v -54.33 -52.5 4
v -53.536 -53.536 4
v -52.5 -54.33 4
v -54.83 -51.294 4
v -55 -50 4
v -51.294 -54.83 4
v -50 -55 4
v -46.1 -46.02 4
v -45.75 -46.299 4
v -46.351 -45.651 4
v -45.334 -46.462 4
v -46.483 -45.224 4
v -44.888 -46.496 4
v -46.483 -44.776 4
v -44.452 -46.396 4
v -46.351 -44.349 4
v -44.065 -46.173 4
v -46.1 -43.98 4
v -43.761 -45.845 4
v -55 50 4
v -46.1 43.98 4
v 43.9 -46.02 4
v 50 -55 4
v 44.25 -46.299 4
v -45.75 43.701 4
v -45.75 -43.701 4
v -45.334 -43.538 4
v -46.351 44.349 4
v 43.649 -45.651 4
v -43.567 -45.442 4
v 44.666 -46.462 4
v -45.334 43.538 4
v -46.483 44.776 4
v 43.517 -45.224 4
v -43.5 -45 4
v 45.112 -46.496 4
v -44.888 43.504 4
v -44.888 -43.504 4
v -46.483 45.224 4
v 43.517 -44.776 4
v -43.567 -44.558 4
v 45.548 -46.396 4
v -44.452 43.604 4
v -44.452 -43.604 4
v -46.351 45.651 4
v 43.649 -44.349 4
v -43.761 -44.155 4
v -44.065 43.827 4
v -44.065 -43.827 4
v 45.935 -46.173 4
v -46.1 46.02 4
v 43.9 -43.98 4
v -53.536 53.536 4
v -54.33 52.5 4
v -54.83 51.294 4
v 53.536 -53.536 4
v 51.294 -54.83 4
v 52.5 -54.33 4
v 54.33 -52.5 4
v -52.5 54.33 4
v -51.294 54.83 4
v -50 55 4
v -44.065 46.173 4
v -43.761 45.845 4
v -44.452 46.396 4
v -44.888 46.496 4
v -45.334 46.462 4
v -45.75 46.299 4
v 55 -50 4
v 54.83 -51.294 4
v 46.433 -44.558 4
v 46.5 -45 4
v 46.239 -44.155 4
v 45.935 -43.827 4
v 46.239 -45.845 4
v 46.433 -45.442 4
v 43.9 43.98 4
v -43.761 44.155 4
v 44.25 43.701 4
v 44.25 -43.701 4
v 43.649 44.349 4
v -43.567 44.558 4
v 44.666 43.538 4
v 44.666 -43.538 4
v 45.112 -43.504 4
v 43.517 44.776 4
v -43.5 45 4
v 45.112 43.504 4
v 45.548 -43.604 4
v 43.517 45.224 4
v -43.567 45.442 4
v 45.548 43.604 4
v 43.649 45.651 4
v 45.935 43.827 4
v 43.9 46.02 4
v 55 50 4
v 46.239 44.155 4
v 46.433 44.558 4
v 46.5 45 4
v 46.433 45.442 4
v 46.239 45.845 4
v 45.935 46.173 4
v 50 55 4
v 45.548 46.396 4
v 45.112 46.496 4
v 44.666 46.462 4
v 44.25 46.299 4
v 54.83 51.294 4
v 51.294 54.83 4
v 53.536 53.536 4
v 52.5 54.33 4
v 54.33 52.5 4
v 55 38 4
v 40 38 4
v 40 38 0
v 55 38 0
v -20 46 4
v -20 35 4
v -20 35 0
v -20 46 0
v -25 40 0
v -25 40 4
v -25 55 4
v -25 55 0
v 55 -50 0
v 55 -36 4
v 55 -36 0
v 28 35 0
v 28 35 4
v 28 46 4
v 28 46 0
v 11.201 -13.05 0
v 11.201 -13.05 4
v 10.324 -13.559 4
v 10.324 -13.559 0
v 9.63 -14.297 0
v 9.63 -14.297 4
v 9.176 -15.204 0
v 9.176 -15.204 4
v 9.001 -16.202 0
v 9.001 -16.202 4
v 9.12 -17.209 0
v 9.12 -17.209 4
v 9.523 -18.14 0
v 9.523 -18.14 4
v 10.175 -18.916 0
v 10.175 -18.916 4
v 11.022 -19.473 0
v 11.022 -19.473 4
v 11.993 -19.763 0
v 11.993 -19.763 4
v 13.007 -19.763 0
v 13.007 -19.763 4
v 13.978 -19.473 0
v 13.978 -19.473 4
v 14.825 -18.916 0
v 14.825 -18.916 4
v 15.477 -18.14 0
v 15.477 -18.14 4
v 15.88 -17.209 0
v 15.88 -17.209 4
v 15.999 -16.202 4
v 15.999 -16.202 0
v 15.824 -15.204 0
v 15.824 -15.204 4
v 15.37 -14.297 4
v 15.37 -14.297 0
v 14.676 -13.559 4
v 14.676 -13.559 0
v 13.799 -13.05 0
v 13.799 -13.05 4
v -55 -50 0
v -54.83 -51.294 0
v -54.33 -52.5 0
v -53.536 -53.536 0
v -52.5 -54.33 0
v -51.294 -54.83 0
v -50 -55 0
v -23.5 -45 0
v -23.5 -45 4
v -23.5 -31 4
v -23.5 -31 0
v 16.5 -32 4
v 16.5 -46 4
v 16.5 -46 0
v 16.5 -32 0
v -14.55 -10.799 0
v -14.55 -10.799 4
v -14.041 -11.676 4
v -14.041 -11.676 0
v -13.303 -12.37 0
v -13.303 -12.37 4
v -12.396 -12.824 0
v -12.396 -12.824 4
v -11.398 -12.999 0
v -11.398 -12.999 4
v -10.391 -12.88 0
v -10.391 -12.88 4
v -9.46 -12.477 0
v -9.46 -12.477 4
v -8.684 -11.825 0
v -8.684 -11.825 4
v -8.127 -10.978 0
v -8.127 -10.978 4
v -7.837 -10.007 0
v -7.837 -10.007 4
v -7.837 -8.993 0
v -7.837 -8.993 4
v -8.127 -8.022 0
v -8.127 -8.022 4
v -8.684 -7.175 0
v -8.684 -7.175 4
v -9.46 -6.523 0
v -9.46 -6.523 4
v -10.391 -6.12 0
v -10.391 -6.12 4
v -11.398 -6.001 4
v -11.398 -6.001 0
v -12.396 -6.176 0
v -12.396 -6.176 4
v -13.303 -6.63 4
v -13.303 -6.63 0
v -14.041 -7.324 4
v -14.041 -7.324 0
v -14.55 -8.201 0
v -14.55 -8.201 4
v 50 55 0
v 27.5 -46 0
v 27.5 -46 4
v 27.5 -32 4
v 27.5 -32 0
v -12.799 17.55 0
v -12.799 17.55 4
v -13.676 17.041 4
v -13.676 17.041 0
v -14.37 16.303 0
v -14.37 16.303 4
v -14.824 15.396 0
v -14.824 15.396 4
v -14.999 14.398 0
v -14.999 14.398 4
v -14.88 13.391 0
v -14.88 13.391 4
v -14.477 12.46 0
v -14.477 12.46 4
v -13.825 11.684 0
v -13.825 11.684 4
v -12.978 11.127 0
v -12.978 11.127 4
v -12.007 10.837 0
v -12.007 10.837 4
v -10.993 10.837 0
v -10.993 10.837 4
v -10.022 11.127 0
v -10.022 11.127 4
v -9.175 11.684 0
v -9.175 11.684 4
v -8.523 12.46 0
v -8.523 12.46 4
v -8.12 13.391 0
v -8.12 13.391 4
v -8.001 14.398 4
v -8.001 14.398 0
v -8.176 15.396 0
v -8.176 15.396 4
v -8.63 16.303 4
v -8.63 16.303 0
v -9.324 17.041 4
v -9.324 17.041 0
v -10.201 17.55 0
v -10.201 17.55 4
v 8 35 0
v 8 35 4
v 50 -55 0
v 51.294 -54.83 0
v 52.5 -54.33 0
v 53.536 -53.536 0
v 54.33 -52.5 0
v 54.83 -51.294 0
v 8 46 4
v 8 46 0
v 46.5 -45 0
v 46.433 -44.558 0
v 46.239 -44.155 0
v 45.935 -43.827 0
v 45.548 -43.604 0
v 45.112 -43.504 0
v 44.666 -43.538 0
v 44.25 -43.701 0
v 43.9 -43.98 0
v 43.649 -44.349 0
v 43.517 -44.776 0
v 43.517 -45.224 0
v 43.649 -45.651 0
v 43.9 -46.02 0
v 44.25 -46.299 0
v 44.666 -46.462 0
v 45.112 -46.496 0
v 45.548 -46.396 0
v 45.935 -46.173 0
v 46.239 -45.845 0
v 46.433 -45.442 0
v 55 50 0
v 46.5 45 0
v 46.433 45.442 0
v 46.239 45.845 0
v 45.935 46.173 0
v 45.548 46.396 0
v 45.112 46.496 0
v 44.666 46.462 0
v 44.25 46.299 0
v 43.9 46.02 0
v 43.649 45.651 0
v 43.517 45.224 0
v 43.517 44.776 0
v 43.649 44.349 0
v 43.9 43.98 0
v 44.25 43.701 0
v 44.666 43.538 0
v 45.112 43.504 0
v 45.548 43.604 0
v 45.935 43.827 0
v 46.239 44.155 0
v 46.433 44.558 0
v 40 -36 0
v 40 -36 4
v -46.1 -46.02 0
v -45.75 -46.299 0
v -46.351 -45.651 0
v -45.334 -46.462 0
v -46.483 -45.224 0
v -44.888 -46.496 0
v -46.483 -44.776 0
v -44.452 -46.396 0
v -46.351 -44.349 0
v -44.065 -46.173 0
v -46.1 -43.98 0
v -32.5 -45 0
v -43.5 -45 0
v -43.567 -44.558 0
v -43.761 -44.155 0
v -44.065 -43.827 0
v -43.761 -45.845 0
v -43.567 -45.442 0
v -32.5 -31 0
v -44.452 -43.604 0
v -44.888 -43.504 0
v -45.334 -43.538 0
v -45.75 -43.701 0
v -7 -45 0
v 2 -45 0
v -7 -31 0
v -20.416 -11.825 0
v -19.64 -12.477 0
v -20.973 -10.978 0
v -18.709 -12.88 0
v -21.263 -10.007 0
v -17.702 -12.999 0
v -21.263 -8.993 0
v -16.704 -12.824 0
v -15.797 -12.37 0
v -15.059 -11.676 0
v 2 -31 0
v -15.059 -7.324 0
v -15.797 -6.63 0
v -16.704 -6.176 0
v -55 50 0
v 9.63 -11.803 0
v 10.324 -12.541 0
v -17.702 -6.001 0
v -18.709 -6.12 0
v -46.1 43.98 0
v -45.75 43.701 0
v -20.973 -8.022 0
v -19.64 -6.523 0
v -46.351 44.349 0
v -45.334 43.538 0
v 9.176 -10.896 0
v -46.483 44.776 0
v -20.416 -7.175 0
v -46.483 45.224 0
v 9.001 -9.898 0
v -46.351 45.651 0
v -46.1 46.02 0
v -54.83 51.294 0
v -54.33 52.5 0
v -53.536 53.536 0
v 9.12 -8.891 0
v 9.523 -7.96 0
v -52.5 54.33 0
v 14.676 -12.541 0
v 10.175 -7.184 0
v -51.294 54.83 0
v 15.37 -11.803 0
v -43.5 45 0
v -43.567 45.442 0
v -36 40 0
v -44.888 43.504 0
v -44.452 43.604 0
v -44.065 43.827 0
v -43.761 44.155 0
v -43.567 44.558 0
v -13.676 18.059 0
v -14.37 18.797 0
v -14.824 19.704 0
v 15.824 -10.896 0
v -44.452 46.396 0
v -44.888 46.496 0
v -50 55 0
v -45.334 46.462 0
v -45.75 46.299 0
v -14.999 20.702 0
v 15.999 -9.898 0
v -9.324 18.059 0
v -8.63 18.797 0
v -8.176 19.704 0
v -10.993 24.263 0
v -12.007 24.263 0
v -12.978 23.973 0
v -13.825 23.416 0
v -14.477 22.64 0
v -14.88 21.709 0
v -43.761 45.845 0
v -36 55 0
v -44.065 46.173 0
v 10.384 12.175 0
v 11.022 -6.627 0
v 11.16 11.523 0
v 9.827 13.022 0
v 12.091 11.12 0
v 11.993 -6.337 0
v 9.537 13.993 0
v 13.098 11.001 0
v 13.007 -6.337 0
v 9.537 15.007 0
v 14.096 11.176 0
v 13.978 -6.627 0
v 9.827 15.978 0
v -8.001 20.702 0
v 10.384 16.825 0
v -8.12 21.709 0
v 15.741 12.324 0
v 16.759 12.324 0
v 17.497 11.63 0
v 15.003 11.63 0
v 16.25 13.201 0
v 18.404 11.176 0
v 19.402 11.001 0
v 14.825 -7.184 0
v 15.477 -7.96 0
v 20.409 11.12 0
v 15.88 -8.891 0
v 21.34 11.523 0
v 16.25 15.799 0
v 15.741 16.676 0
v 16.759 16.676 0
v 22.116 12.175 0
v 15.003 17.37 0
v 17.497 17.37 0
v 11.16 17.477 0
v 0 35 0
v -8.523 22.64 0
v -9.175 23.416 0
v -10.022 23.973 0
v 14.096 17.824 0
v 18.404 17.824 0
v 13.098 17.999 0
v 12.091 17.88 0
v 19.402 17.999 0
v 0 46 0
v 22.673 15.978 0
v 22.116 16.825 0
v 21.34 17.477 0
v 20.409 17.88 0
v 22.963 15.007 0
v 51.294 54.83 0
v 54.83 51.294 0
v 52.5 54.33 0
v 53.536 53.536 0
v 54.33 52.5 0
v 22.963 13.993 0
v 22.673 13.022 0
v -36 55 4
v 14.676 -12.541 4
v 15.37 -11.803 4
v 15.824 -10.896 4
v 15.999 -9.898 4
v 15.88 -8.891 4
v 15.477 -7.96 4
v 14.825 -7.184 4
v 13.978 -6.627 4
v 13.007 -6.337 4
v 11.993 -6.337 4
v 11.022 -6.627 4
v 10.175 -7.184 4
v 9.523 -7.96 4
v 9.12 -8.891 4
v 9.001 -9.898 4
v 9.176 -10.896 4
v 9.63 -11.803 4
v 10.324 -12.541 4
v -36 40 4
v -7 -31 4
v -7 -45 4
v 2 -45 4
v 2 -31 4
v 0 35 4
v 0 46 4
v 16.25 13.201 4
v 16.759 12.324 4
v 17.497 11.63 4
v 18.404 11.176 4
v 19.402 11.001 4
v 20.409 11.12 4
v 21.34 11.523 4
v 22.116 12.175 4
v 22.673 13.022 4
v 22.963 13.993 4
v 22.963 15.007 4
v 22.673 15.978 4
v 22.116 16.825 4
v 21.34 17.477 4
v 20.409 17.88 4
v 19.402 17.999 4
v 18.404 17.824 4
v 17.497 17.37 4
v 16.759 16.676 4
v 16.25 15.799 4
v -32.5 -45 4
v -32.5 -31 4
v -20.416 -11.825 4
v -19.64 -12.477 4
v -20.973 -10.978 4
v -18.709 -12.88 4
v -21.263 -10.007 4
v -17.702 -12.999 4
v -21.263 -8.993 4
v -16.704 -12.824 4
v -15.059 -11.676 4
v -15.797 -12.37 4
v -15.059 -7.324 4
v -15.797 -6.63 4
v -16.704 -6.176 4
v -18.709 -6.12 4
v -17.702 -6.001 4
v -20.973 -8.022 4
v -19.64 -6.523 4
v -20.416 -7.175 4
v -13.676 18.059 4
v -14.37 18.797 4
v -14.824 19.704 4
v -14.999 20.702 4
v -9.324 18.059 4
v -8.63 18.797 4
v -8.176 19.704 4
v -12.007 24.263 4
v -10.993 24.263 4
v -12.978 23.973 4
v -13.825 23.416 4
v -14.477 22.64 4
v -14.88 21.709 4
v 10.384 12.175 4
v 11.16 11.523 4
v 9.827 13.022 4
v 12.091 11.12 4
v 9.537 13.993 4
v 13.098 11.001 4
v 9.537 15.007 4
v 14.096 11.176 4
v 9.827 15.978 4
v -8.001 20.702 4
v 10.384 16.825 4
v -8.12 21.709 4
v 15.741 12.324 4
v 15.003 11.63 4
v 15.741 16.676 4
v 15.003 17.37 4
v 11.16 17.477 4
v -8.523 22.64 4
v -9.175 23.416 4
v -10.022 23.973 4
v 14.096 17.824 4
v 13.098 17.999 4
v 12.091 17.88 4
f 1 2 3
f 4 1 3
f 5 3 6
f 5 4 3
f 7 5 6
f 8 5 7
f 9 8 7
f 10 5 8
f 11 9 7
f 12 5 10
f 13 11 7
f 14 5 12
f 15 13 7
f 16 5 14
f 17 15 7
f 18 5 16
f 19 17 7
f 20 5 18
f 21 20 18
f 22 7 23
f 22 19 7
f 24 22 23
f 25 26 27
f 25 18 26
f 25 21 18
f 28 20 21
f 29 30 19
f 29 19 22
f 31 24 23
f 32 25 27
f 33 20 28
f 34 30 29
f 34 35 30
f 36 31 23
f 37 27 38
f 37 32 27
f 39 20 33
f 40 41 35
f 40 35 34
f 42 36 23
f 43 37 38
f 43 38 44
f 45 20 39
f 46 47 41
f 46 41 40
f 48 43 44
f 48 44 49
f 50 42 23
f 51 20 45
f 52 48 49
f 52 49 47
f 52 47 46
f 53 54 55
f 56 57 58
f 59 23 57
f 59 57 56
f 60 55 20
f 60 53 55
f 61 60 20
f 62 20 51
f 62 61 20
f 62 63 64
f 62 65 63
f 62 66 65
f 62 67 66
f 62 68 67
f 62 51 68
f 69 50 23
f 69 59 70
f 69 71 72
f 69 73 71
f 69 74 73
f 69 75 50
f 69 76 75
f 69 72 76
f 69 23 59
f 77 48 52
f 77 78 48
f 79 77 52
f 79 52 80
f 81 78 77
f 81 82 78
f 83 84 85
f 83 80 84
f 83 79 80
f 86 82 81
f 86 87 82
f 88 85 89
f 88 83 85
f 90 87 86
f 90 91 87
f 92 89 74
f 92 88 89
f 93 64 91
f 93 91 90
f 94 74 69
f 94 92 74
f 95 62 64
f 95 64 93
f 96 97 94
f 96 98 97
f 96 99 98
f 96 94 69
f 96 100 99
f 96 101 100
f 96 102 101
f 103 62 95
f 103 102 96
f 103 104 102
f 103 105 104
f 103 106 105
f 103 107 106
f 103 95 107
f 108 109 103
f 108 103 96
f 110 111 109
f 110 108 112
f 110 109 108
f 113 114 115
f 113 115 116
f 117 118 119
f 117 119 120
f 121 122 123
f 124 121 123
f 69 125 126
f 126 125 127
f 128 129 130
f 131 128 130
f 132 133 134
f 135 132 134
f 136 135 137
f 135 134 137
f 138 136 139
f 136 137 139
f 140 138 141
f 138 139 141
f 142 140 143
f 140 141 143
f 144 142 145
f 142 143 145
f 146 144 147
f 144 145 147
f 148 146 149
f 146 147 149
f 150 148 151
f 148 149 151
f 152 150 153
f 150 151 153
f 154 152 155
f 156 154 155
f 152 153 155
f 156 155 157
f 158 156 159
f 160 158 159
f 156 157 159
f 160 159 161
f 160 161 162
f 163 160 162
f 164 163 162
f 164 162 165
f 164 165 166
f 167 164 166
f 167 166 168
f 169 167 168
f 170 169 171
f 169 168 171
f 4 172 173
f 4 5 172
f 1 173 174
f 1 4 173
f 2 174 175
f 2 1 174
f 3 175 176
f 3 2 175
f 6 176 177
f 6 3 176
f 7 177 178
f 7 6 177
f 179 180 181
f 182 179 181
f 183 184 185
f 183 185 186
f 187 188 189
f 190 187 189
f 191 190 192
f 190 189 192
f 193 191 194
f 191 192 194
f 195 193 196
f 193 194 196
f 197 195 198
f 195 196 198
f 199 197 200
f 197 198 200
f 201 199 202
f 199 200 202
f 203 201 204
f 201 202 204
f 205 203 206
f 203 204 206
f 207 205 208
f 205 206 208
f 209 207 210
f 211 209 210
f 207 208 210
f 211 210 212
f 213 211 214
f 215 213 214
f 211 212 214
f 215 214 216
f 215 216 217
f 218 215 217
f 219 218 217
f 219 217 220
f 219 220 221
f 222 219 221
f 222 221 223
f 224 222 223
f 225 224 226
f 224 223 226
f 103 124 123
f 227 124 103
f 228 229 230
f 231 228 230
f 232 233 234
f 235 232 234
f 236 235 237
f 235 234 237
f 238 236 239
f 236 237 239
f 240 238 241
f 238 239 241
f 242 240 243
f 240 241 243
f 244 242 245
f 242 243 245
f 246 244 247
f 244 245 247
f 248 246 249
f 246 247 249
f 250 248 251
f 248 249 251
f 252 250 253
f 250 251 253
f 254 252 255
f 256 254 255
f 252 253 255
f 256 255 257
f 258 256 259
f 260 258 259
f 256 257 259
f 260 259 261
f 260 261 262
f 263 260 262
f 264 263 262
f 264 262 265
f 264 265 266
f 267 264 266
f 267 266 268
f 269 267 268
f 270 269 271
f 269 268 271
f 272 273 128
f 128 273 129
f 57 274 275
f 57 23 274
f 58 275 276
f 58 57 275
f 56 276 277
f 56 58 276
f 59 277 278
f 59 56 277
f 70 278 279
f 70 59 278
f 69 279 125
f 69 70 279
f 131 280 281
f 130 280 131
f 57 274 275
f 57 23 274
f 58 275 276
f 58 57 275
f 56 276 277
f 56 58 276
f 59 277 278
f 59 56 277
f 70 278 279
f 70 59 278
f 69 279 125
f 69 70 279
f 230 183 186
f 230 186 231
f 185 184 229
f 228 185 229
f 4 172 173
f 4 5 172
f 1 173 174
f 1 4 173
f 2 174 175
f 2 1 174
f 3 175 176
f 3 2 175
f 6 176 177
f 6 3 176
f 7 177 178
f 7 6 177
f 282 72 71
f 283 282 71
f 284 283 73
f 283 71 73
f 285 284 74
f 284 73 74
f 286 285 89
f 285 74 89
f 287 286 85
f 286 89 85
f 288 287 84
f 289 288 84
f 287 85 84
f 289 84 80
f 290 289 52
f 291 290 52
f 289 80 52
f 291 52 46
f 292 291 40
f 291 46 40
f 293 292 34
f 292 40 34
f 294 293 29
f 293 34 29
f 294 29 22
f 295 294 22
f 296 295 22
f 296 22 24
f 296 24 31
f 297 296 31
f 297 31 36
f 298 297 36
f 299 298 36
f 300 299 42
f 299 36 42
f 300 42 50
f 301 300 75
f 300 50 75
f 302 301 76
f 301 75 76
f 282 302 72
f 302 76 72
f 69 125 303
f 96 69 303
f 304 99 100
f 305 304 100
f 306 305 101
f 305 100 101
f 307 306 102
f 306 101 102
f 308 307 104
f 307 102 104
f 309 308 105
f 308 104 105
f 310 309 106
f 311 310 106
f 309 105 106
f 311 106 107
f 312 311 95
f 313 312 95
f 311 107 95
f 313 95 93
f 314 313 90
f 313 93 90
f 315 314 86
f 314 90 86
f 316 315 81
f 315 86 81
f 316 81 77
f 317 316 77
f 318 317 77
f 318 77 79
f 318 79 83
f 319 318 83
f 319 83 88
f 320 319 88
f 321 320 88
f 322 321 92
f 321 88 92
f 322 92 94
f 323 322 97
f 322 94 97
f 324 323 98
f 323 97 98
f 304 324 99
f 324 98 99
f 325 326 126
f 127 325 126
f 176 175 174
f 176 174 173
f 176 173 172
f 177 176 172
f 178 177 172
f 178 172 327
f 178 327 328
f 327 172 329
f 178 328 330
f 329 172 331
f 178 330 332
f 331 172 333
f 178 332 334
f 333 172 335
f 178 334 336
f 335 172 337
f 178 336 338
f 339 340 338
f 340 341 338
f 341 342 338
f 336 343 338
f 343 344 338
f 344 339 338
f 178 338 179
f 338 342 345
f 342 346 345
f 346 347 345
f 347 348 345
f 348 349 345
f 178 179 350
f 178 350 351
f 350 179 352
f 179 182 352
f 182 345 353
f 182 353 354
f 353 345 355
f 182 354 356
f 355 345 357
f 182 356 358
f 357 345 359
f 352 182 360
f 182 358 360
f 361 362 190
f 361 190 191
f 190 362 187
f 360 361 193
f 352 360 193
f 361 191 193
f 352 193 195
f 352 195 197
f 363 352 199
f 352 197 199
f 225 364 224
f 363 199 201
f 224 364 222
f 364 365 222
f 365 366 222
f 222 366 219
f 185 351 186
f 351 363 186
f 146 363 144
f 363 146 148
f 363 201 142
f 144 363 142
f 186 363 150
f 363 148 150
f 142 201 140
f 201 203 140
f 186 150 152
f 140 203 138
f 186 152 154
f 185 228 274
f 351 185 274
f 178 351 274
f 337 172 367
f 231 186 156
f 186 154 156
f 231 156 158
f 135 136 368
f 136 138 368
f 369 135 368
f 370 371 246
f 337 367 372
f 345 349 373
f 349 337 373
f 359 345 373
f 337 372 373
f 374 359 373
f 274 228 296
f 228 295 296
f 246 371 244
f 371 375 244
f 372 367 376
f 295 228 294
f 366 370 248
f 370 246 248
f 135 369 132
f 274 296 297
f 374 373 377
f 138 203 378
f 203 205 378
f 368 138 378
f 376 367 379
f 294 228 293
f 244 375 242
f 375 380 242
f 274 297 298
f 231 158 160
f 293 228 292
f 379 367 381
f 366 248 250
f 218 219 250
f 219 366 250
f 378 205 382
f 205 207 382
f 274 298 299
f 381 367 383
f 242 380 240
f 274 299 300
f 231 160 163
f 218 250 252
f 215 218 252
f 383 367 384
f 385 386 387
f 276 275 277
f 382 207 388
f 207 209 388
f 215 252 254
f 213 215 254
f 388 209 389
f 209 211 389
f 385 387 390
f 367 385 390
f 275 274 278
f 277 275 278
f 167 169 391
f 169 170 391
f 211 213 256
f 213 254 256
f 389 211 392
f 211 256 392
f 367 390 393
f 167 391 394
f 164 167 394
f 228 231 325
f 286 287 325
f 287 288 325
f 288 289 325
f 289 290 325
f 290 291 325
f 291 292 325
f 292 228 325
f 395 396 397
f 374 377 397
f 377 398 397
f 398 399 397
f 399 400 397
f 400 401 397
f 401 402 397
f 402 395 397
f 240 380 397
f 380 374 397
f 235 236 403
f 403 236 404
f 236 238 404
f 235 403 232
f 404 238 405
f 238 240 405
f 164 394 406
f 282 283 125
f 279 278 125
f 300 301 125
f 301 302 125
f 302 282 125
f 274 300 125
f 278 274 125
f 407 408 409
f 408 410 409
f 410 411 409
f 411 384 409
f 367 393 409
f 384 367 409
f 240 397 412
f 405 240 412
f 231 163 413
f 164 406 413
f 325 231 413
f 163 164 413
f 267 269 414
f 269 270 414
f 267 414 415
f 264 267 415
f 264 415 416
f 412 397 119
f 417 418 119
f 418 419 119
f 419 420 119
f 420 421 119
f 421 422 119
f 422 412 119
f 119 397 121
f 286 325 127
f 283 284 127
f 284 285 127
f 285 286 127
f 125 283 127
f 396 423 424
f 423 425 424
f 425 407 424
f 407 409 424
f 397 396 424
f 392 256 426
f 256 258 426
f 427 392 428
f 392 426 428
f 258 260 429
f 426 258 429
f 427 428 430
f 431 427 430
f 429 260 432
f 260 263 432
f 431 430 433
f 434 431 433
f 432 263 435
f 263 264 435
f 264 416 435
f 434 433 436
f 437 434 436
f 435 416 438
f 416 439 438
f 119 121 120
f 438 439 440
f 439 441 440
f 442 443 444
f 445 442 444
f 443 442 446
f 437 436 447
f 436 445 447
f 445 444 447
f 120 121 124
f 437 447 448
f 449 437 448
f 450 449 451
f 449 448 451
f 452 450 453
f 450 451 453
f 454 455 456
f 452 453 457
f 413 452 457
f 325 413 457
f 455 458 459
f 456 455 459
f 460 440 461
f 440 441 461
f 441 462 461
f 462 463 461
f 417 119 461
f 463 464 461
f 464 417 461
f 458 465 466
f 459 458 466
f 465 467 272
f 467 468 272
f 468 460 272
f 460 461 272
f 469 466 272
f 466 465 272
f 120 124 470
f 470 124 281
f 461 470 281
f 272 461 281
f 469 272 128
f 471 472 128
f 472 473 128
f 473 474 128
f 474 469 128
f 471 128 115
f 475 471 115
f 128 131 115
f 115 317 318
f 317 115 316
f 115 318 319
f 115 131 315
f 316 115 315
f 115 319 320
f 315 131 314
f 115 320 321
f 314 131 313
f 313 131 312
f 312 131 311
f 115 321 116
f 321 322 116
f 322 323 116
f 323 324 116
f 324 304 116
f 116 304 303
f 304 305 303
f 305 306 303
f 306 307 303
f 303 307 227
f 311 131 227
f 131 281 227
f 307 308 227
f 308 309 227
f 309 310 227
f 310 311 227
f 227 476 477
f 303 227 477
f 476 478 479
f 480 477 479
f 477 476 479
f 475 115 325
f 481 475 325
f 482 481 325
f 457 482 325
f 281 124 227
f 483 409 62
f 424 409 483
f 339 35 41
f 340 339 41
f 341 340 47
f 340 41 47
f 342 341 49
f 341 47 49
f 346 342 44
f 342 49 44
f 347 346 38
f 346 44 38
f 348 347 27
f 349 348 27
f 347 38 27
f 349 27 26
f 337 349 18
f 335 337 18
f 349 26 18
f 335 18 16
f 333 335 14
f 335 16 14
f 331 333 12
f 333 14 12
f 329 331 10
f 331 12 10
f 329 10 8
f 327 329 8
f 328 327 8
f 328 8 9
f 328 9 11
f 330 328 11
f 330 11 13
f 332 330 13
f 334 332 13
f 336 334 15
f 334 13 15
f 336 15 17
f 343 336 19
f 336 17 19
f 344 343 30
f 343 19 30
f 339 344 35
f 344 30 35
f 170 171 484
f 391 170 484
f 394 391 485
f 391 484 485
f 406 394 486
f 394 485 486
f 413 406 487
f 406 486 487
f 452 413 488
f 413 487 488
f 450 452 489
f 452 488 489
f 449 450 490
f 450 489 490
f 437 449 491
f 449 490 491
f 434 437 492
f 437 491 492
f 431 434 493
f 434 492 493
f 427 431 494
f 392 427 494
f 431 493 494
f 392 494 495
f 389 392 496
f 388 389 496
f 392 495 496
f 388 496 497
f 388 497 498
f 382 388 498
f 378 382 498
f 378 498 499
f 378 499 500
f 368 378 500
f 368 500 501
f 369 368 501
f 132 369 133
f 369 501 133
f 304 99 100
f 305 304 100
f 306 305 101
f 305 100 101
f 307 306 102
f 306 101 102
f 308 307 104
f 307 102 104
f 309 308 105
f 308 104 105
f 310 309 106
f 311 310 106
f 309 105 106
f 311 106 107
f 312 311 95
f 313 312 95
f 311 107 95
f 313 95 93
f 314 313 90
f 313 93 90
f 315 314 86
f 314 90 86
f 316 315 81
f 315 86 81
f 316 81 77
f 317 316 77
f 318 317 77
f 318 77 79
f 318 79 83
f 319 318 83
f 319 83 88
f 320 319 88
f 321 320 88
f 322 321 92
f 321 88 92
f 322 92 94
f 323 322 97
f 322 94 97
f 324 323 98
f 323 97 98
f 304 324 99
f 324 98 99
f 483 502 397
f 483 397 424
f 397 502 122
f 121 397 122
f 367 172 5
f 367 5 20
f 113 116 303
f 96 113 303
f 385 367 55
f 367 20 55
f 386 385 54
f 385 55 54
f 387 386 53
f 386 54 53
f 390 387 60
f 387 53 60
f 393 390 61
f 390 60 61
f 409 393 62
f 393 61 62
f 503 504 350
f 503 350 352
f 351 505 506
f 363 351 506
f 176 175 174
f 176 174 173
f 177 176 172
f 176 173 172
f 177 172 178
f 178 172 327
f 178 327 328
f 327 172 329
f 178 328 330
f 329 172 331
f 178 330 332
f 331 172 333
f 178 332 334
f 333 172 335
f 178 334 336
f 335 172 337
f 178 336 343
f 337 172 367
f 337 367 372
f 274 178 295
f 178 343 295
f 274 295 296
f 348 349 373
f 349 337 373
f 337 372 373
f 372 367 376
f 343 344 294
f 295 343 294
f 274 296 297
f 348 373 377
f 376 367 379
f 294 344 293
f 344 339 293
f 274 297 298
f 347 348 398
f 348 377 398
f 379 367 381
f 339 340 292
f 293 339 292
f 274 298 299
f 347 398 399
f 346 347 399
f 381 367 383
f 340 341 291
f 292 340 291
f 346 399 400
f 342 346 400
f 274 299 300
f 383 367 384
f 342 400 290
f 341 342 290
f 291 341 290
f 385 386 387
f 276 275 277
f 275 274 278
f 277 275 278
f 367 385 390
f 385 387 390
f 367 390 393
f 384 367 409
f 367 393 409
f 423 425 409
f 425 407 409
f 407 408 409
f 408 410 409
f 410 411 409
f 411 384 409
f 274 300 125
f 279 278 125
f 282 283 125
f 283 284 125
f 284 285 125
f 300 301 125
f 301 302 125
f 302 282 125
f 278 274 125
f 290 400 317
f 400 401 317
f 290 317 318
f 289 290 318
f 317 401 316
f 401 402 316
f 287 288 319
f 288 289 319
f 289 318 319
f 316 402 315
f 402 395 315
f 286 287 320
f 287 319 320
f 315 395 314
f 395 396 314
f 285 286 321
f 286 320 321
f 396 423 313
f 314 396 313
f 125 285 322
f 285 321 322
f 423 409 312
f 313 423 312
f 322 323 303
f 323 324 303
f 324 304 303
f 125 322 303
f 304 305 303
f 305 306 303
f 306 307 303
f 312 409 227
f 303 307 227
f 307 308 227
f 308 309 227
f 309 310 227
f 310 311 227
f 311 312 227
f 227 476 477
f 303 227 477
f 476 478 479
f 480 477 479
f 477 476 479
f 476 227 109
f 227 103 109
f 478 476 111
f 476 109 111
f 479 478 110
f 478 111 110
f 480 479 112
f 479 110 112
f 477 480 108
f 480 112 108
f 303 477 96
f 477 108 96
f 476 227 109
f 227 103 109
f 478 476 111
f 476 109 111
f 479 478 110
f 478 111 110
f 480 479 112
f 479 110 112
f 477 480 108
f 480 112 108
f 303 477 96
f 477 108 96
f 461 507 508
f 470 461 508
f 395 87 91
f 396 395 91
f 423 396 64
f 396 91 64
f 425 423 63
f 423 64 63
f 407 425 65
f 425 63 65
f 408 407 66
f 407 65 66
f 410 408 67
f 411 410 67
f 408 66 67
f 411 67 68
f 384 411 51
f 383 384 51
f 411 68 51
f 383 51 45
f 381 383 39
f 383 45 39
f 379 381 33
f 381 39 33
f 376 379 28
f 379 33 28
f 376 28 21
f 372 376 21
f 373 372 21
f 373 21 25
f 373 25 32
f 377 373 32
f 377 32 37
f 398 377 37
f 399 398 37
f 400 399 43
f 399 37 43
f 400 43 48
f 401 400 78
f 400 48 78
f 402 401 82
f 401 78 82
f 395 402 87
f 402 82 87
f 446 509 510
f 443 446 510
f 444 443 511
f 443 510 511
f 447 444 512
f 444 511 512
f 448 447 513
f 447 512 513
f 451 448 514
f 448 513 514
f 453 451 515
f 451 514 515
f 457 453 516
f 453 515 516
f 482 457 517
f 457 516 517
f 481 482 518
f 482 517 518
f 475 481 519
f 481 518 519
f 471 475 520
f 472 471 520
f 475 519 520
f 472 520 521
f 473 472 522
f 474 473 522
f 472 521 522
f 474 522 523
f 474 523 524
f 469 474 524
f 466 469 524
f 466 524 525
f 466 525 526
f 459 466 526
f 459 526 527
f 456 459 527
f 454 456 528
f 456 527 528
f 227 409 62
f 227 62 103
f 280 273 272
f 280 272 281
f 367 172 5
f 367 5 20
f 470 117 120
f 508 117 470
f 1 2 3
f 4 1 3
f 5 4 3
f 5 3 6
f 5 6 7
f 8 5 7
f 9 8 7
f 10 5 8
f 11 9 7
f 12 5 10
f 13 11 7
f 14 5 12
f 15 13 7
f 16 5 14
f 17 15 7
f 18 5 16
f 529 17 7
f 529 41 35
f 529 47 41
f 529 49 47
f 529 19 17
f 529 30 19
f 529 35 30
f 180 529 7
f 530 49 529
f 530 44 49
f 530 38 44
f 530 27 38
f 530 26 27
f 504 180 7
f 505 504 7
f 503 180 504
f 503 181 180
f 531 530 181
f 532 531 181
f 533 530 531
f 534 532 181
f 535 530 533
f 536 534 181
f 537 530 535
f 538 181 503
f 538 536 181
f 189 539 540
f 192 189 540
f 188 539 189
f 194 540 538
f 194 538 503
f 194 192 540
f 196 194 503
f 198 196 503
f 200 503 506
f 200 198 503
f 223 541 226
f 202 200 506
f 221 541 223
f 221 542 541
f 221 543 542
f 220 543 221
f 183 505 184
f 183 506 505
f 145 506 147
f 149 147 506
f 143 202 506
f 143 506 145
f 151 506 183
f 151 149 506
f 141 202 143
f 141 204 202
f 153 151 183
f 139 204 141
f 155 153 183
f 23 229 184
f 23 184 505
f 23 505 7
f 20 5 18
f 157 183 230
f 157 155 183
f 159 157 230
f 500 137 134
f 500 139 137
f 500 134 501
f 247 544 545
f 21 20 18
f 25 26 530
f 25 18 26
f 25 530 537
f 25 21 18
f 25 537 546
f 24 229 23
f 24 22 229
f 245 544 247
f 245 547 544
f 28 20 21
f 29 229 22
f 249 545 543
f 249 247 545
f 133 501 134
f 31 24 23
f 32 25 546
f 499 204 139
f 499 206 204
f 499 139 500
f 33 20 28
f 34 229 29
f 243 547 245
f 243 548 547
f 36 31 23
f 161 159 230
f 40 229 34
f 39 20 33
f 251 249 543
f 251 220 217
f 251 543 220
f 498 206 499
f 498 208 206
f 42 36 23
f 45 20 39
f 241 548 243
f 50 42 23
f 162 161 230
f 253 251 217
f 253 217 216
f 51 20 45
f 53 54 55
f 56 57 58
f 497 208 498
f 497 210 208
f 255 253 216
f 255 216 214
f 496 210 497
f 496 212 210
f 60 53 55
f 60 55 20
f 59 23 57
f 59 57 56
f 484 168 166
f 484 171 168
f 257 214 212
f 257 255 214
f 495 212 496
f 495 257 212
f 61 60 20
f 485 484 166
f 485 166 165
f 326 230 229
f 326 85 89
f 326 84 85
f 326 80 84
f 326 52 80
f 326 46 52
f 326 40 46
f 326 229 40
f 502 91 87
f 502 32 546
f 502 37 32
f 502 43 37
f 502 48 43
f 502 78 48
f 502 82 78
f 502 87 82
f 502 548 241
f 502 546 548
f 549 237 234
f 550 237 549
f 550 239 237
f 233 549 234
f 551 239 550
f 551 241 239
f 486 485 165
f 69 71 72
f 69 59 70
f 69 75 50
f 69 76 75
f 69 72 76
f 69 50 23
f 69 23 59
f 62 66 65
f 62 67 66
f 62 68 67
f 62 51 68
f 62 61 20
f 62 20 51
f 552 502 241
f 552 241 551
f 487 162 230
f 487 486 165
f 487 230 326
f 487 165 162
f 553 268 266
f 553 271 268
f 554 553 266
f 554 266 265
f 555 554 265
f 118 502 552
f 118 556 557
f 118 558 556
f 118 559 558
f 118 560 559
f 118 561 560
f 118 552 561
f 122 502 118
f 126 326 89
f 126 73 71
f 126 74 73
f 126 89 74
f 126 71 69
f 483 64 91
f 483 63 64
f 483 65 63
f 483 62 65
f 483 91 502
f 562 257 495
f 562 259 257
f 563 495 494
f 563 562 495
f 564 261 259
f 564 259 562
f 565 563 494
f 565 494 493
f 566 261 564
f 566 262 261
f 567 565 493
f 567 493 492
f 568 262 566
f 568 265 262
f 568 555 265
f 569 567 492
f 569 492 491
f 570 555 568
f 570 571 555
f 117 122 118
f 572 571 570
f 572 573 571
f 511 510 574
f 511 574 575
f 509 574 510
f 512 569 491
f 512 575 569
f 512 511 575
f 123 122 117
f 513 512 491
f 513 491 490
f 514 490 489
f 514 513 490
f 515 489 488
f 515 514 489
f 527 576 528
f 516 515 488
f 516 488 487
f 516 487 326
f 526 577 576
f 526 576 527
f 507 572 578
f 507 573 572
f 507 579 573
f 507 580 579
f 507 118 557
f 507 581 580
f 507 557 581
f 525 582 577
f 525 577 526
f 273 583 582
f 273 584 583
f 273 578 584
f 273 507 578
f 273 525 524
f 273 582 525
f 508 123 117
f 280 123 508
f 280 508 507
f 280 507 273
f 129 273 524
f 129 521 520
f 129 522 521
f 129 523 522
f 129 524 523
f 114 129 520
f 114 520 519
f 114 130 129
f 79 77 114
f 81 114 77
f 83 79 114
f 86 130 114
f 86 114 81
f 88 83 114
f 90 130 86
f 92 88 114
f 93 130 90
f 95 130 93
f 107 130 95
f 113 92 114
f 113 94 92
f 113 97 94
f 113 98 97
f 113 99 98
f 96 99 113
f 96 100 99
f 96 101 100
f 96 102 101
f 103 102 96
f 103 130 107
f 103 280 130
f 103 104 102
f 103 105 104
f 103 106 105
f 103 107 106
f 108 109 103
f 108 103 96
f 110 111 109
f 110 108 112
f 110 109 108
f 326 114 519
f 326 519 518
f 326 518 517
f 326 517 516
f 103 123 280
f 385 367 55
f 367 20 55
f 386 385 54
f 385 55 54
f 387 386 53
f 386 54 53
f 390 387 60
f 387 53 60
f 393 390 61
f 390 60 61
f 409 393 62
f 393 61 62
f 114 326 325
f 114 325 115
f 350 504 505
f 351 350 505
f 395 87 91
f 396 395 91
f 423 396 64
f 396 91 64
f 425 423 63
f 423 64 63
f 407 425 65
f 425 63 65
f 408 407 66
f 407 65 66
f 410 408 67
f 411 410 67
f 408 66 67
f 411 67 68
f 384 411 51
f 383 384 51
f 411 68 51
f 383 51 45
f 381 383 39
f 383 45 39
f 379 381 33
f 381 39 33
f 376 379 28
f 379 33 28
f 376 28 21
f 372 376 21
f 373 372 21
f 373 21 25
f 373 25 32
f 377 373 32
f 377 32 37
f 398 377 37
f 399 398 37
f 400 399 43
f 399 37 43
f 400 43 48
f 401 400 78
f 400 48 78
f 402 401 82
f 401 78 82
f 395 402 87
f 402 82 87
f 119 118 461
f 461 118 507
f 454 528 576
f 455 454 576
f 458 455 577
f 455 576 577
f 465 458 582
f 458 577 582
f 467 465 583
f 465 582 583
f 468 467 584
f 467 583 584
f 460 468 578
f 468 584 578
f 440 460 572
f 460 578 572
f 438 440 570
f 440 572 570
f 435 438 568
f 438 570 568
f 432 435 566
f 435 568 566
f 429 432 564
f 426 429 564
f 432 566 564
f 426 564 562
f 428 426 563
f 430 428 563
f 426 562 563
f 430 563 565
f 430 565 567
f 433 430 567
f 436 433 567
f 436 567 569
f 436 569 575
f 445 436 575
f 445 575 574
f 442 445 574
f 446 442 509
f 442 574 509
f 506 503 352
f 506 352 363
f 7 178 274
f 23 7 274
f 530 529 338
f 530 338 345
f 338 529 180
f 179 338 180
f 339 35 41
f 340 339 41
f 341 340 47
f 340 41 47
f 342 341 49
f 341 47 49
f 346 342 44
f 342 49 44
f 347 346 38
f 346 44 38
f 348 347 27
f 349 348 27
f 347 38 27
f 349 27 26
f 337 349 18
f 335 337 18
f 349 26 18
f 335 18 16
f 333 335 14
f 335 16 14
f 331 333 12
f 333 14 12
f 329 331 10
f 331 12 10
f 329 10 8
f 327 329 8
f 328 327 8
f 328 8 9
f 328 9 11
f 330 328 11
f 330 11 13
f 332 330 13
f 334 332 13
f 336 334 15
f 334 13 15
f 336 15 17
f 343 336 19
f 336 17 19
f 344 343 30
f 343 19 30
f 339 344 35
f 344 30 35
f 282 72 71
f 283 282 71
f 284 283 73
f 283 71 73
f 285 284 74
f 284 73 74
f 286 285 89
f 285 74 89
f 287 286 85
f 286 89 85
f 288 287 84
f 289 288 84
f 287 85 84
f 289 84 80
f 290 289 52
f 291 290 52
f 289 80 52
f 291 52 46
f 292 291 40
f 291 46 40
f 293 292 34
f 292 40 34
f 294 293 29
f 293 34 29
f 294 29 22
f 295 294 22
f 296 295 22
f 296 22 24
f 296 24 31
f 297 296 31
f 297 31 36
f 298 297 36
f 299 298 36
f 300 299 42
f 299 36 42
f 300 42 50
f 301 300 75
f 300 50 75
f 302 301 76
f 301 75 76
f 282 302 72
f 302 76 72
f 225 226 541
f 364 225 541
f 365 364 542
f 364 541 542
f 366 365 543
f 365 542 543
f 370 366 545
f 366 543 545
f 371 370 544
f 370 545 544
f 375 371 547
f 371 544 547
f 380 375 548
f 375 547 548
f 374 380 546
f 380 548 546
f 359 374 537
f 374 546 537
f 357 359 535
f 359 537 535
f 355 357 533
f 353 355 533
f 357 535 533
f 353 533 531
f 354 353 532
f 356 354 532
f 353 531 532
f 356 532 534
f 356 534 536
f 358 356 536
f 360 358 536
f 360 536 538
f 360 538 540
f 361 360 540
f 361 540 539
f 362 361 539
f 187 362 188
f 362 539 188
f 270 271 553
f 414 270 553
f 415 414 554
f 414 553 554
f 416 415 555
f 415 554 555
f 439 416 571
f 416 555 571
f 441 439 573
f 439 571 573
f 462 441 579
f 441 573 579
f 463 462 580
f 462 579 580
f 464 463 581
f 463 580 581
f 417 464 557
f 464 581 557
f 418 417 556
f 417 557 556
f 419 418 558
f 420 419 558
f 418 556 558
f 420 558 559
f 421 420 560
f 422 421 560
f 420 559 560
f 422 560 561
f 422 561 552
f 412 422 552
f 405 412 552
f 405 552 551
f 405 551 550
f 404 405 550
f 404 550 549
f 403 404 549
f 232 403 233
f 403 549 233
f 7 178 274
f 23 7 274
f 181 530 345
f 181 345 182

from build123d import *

# Parameters (mm, degrees)
SKETCH_W        = 110
SKETCH_H        = 110
PAD_DEPTH       = 4
SKETCH001_R     = 1.5
POCKET_DEPTH    = 4
FILLET_R        = 5
SKETCH002_W     = 110
SKETCH002_H     = 110
PAD001_DEPTH    = 4
SKETCH003_R     = 1.5
POCKET001_DEPTH = 4
FILLET001_R     = 5
SKETCH004_W     = 15
SKETCH004_H     = 74
SKETCH004_W_2   = 11
SKETCH004_H_2   = 15
POCKET002_DEPTH = 4
SKETCH005_W     = 20
SKETCH005_H     = 11
SKETCH005_W_2   = 9
SKETCH005_H_2   = 14
SKETCH005_W_3   = 11
POCKET003_DEPTH = 4
POCKET004_DEPTH = 4


with BuildPart() as bottom:
    # Sketch → Pad (new body)
    with BuildSketch(Plane.XY):
        Rectangle(SKETCH_W, SKETCH_H)
    extrude(amount=PAD_DEPTH)

    # Sketch001 (on Face6 of Pad) → Pocket (cut)
    with BuildSketch(Plane.XY.offset(4)):
        with Locations((-45, 45)):
            Circle(SKETCH001_R)
        with Locations((45, 45)):
            Circle(SKETCH001_R)
        with Locations((-45, -45)):
            Circle(SKETCH001_R)
        with Locations((45, -45)):
            Circle(SKETCH001_R)
    extrude(amount=-POCKET_DEPTH, mode=Mode.SUBTRACT)

    # Fillet
    fillet_edges = [bottom.edges().sort_by_distance(p)[0] for p in [
        (55, -55, 2),
        (-55, -55, 2),
        (55, 55, 2),
        (-55, 55, 2),
    ]]
    fillet(fillet_edges, radius=FILLET_R)


with BuildPart() as top:
    # Sketch002 → Pad001 (new body)
    with BuildSketch(Plane.XY):
        Rectangle(SKETCH002_W, SKETCH002_H)
    extrude(amount=PAD001_DEPTH)

    # Sketch003 (on Face6 of Pad001) → Pocket001 (cut)
    with BuildSketch(Plane.XY.offset(4)):
        with Locations((-45, 45)):
            Circle(SKETCH003_R)
        with Locations((45, 45)):
            Circle(SKETCH003_R)
        with Locations((-45, -45)):
            Circle(SKETCH003_R)
        with Locations((45, -45)):
            Circle(SKETCH003_R)
    extrude(amount=-POCKET001_DEPTH, mode=Mode.SUBTRACT)

    # Fillet001
    fillet001_edges = [top.edges().sort_by_distance(p)[0] for p in [
        (55, -55, 2),
        (-55, -55, 2),
        (55, 55, 2),
        (-55, 55, 2),
    ]]
    fillet(fillet001_edges, radius=FILLET001_R)

    # Sketch004 (on Face5 of Fillet001) → Pocket002 (cut)
    with BuildSketch(Plane.XY.offset(4)):
        with Locations((47.5, 1)):
            Rectangle(SKETCH004_W, SKETCH004_H)
        with Locations((-30.5, 47.5)):
            Rectangle(SKETCH004_W_2, SKETCH004_H_2)
    extrude(amount=-POCKET002_DEPTH, mode=Mode.SUBTRACT)

    # Sketch005 (on Face4 of Pocket002) → Pocket003 (cut)
    with BuildSketch(Plane.XY.offset(4)):
        with Locations((-10, 40.5)):
            Rectangle(SKETCH005_W, SKETCH005_H)
        with Locations((18, 40.5)):
            Rectangle(SKETCH005_W, SKETCH005_H)
        with Locations((-28, -38)):
            Rectangle(SKETCH005_W_2, SKETCH005_H_2)
        with Locations((-2.5, -38)):
            Rectangle(SKETCH005_W_2, SKETCH005_H_2)
        with Locations((22, -39)):
            Rectangle(SKETCH005_W_3, SKETCH005_H_2)
    extrude(amount=-POCKET003_DEPTH, mode=Mode.SUBTRACT)

    # Sketch006 (on Face4 of Pocket003) → Pocket004 (cut)
    with BuildSketch(Plane.XY.offset(4)):
        with BuildLine():
            ThreePointArc((-12.799038, 17.55), (-11.5, 10.8), (-10.200962, 17.55))
            ThreePointArc((-10.200962, 17.55), (-11.5, 24.3), (-12.799038, 17.55))
        make_face()
        with BuildLine():
            ThreePointArc((16.25, 15.799038), (9.5, 14.5), (16.25, 13.200962))
            ThreePointArc((16.25, 13.200962), (23, 14.5), (16.25, 15.799038))
        make_face()
        with BuildLine():
            ThreePointArc((13.799038, -13.05), (12.5, -6.3), (11.200962, -13.05))
            ThreePointArc((11.200962, -13.05), (12.5, -19.8), (13.799038, -13.05))
        make_face()
        with BuildLine():
            ThreePointArc((-14.55, -10.799038), (-7.8, -9.5), (-14.55, -8.200962))
            ThreePointArc((-14.55, -8.200962), (-21.3, -9.5), (-14.55, -10.799038))
        make_face()
    extrude(amount=-POCKET004_DEPTH, mode=Mode.SUBTRACT)


solid = Compound([bottom.part, top.part])
